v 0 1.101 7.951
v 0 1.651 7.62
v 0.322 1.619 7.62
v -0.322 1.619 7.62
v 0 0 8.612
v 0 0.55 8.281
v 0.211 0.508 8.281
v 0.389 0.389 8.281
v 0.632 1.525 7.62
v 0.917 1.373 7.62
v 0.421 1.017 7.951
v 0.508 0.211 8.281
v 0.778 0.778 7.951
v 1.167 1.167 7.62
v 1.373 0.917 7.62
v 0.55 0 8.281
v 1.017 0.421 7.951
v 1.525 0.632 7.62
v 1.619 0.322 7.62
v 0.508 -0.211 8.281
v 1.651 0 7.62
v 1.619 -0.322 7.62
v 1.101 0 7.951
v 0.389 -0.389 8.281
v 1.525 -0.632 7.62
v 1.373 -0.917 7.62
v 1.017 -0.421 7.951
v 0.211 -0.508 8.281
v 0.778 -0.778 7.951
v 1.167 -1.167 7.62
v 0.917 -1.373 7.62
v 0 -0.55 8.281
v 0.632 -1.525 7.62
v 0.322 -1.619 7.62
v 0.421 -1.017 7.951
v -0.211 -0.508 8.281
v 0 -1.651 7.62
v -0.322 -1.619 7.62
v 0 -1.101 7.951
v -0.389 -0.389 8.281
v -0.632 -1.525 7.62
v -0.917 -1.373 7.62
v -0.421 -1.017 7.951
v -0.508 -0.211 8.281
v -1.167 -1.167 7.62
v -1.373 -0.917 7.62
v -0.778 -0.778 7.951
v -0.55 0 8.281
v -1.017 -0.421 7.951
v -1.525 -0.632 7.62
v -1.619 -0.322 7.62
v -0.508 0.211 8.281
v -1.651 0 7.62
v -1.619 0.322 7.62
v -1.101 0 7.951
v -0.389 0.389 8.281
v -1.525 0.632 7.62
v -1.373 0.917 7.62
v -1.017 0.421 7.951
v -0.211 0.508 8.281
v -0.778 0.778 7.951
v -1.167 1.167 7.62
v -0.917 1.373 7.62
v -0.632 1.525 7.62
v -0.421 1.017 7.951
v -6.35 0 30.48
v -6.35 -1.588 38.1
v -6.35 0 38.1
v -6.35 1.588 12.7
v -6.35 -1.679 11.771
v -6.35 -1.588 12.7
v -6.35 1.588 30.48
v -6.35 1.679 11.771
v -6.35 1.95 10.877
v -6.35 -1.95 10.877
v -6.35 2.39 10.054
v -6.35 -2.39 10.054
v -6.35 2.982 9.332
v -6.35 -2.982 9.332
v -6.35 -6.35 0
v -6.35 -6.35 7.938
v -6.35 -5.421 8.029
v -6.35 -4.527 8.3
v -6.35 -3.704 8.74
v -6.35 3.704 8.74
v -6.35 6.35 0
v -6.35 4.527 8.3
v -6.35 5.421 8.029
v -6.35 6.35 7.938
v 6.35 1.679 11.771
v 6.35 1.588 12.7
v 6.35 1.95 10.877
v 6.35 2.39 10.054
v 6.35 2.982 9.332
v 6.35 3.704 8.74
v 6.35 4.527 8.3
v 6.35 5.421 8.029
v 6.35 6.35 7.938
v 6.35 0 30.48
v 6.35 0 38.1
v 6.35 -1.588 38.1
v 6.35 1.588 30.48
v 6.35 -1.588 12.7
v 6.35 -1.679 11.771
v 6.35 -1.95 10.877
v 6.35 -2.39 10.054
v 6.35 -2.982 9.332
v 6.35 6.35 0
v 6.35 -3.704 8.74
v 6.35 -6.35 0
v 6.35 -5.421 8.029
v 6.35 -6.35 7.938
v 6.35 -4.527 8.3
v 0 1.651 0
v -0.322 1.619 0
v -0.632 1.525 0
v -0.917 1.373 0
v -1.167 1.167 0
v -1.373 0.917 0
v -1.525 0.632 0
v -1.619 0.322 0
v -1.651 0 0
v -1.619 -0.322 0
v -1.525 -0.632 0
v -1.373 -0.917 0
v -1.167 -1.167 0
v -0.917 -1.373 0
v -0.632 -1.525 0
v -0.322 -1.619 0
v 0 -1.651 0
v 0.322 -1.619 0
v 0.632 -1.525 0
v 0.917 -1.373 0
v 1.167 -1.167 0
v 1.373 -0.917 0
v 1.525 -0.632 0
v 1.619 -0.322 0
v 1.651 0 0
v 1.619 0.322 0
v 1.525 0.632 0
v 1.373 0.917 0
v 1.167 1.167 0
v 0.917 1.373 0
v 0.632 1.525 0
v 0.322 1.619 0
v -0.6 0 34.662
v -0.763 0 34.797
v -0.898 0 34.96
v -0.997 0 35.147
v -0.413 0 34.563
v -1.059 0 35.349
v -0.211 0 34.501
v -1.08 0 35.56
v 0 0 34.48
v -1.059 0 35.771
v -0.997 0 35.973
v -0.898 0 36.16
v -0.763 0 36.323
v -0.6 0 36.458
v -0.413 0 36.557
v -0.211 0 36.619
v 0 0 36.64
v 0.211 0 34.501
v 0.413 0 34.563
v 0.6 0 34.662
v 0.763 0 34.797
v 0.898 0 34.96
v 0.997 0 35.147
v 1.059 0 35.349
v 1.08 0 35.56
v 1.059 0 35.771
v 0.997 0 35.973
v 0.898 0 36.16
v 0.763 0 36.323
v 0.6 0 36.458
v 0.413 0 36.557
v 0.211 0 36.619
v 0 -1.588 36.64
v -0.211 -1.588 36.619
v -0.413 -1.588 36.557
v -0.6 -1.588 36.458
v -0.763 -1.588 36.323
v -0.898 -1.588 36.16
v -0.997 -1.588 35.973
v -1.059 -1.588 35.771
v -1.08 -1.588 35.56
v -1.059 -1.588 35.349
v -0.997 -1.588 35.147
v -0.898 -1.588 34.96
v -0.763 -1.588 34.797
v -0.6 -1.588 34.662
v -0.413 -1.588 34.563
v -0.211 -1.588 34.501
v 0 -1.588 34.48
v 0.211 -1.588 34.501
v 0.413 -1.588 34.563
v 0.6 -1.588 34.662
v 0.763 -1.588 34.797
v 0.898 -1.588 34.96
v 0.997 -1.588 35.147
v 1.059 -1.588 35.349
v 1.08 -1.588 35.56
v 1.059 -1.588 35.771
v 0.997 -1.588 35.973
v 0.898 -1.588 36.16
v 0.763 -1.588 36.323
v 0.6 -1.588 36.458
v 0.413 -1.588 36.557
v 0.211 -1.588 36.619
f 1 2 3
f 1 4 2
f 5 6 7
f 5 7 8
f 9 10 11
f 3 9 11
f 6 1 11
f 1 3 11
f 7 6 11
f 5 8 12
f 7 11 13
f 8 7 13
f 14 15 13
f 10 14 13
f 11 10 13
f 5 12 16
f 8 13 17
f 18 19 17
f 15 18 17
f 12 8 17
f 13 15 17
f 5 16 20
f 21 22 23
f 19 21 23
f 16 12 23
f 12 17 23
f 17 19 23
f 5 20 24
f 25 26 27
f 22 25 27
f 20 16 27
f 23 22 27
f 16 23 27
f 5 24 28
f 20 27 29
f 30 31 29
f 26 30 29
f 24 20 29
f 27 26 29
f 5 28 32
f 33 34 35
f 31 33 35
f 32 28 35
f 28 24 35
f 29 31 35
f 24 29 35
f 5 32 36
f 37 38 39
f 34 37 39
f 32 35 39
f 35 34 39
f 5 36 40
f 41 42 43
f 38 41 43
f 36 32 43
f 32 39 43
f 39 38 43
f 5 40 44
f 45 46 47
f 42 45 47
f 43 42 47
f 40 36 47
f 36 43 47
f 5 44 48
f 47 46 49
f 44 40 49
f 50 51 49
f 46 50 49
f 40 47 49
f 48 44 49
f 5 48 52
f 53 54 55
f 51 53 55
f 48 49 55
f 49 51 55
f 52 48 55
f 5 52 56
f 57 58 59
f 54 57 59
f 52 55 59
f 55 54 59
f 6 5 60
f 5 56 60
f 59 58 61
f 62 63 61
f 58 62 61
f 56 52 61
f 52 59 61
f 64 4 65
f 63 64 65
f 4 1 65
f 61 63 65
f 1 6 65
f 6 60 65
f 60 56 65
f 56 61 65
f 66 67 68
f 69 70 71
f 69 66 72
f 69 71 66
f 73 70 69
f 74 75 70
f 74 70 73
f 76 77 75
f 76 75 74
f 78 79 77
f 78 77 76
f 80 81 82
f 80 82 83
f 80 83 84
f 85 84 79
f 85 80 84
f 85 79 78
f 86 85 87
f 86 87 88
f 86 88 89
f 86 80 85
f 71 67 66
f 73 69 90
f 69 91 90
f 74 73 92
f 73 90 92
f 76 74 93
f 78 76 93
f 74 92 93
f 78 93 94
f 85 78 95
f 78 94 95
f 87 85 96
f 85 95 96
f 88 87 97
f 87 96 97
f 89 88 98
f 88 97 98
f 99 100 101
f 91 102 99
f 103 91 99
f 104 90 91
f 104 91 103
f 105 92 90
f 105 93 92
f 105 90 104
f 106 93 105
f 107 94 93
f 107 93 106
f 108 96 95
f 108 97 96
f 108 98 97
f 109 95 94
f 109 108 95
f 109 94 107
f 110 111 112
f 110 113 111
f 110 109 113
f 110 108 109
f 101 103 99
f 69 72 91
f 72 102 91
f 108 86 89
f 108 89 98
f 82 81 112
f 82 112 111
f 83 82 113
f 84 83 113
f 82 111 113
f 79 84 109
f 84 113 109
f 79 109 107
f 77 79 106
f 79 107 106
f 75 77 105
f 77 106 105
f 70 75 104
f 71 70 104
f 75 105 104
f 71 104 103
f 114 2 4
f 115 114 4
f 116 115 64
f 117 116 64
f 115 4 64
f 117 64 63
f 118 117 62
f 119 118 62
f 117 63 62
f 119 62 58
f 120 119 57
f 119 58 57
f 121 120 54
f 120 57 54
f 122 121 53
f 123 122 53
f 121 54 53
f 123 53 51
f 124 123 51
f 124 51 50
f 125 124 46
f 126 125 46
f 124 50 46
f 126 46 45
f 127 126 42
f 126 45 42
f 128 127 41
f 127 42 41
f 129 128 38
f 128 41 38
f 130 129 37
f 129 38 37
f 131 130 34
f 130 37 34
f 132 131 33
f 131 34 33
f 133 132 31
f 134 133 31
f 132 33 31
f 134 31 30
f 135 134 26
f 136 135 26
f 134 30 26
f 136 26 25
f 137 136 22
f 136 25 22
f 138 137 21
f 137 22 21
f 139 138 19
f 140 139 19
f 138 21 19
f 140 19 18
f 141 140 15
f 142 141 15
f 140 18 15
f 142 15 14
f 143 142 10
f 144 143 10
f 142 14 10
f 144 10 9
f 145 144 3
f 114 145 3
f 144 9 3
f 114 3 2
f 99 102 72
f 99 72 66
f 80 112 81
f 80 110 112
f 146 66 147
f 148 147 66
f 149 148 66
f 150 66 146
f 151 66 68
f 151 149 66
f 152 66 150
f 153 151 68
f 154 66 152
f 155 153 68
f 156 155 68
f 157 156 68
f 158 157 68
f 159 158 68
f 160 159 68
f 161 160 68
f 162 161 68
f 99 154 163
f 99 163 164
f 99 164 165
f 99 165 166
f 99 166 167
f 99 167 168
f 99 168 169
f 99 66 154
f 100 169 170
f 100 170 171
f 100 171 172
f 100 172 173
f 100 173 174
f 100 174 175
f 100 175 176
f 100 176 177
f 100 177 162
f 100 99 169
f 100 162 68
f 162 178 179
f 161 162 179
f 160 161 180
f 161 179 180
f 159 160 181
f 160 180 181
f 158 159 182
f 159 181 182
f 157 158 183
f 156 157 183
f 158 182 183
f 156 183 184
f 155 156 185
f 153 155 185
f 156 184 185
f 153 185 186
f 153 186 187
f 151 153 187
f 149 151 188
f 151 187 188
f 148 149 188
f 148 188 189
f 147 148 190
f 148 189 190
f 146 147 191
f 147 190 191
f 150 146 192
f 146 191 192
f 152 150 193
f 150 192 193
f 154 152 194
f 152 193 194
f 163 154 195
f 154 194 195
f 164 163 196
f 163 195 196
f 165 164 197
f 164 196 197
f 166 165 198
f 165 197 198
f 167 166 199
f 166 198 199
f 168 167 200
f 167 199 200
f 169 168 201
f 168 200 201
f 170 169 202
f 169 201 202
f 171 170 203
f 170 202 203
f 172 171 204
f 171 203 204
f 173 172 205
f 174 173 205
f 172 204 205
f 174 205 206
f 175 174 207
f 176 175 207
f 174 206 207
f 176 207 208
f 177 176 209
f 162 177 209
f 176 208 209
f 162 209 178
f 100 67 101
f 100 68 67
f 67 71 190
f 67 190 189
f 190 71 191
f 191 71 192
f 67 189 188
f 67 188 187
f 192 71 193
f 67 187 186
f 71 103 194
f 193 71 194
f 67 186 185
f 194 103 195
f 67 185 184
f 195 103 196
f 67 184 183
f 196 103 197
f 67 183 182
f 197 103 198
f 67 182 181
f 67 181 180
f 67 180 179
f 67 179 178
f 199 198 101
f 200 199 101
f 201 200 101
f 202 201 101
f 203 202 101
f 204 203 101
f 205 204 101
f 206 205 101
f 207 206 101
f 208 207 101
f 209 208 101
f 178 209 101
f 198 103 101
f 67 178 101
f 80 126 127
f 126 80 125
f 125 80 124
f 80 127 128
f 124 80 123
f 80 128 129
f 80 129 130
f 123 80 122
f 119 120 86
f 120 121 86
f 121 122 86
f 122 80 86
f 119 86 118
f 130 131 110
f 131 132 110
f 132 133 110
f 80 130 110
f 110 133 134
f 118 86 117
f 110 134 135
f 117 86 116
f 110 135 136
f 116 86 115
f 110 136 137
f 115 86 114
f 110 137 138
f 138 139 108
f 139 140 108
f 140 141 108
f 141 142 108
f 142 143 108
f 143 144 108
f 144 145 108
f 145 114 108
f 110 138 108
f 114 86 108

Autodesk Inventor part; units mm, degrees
ref_plane "YZ Plane" through (0, 0, 0) normal (1, 0, 0) x (0, 1, 0)
ref_plane "XZ Plane" through (0, 0, 0) normal (0, 1, 0) x (-1, 0, 0)
sketch "Sketch1" plane through (0, 0, 0) normal (0, 0, 1) x (1, 0, 0)
  line L0 (-6.35, 6.35) -> (6.35, 6.35)
  line L1 (6.35, 6.35) -> (6.35, -6.35)
  line L2 (6.35, -6.35) -> (-6.35, -6.35)
  line L3 (-6.35, -6.35) -> (-6.35, 6.35)
  point P0 (0, 0)
  point P1 (0, 6.35)
  point P2 (-6.35, 0)
  dimension "d0" = 12.7
  dimension "d1" = 12.7
extrude "Extrusion1" add sketch "Sketch1" along normal blind 38.1
ref_plane "Work Plane1" through (19.05, -6.35, 0) normal (1, 0, 0) x (0, 0, -1)
sketch "Sketch2" plane through (19.05, -6.35, 0) normal (1, 0, 0) x (0, 0, -1)
  line L0 (-38.1, 12.7) -> (-38.1, 0) projected
  line L1 (0, 0) -> (-38.1, 0) projected
  line L2 (0, 12.7) -> (0, 0) projected
  line L3 (0, 12.7) -> (-38.1, 12.7) projected
  line L4 (-38.1, 7.9375) -> (-12.7, 7.9375)
  arc A0 (-12.7, 7.9375) -> (-7.9375, 12.7) centre (-12.7, 12.7) ccw
  point P0 (0, 6.35)
  dimension "d5" = 25.4
  dimension "d6" = 1.5875
  dimension "d7" = 4.7625
extrude "Extrusion2" cut sketch "Sketch2" against normal blind 38.1 contours L3 A0 L4 L0
mirror "Mirror1" about plane through (0, 0, 0) normal (0, 1, 0) of "Extrusion2"
sketch "Sketch3" plane through (19.05, -6.35, 0) normal (1, 0, 0) x (0, 0, -1)
  arc A0 (-7.9375, 0) -> (-12.7, 4.7625) centre (-12.7, 0) ccw projected
  line L0 (0, 0) -> (-7.9375, 0) projected
  line L1 (0, 12.7) -> (0, 0) projected
  line L2 (0, 12.7) -> (-7.9375, 12.7) projected
  arc A1 (-12.7, 7.9375) -> (-7.9375, 12.7) centre (-12.7, 12.7) ccw projected
  line L3 (-12.7, 7.9375) -> (-38.1, 7.9375) projected
  line L4 (-38.1, 7.9375) -> (-38.1, 4.7625) projected
  line L5 (-38.1, 4.7625) -> (-12.7, 4.7625) projected
  line L6 (-30.48, 7.9375) -> (-30.48, 6.35)
  line L7 (-30.48, 6.35) -> (-38.1, 6.35)
  point P0 (0, 6.35)
  dimension "d10" = 1.5875
  dimension "d11" = 7.62
extrude "Extrusion3" cut sketch "Sketch3" against normal blind 38.1 contours L4 L3 L6 L7
sketch "Sketch4" plane through (-6.35, 0, 30.48) normal (0, 1, 0) x (1, 0, 0)
  line L0 (0, -7.62) -> (0, 0) projected
  line L1 (12.7, -7.62) -> (0, -7.62) projected
  point P0 (6.35, 30.48)
  point P1 (6.35, -5.08)
  dimension "d14" = 6.35
  dimension "d15" = 2.54
hole "Hole1" at (0, 0, 35.56) direction (0, -1, 0) diameter 2.159 end through all
sketch "Sketch5" plane through (0, 0, 0) normal (0, 0, -1) x (-1, 0, 0)
  point P0 (0, 0)
  point P1 (0, 0)
hole "Hole2" at (0, 0, 0) direction (0, 0, 1) diameter 3.302 depth 7.62 tip angle 118 thread size "8-32 UNC" class "2B" standard "ANSI Unified Screw Threads"
properties part number "headplateHolder"
